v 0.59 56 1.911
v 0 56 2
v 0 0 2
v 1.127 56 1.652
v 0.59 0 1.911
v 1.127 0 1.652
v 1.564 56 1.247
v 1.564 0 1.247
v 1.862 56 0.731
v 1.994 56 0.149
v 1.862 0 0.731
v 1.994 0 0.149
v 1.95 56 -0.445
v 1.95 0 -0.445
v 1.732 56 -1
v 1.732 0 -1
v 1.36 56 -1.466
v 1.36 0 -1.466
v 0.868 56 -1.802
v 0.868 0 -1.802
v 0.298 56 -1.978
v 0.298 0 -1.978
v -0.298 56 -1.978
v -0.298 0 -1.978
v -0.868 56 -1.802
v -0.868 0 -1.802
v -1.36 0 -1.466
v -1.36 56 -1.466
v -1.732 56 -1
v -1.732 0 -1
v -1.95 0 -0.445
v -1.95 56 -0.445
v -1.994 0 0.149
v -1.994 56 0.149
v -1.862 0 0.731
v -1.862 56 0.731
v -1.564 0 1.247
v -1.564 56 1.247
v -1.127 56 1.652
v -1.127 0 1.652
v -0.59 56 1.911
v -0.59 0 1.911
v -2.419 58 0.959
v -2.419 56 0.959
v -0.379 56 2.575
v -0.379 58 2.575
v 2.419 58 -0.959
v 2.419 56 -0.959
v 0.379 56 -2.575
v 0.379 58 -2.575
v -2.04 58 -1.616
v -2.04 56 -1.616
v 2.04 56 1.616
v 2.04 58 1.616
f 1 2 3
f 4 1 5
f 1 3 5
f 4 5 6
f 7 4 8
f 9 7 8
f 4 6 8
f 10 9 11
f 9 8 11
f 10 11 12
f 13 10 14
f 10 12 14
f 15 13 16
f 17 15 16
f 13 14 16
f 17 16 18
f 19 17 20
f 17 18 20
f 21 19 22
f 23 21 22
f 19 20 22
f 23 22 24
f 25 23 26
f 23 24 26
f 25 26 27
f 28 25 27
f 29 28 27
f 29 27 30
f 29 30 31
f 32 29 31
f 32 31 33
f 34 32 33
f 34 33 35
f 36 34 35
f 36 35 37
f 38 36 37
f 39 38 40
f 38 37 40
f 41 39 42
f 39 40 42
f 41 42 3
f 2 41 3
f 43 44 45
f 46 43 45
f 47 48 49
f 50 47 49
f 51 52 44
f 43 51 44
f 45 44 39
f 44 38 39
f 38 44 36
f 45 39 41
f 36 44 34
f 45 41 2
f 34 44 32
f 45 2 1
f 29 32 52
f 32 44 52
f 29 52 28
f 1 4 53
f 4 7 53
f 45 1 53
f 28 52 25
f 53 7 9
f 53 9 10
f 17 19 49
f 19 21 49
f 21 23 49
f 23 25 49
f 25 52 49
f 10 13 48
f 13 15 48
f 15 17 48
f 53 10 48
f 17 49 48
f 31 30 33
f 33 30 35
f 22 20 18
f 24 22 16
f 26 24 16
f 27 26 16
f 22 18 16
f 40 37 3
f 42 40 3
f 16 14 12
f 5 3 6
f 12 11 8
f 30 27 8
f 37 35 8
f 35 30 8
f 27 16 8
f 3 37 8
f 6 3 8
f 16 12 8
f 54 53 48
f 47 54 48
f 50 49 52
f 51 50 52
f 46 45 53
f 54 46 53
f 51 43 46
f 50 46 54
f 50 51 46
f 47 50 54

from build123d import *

# Parameters (mm, degrees)
SKETCH1_R           = 2
BOSS_EXTRUDE1_DEPTH = 56
BOSS_EXTRUDE2_DEPTH = 2


with BuildPart() as part:
    # Sketch1 → Boss-Extrude1 (new body)
    with BuildSketch(Plane(origin=(0, 0, 0), x_dir=(1, 0, 0), z_dir=(0, 1, 0))):
        with Locations(Location((0, 0, 0), (0, 0, 270))):
            Circle(SKETCH1_R)
    extrude(amount=BOSS_EXTRUDE1_DEPTH)

    # Sketch2 → Boss-Extrude2 (add)
    with BuildSketch(Plane(origin=(0, 56, 0), x_dir=(1, 0, 0), z_dir=(0, 1, 0))):
        Polygon((2.039992028, -1.615670017), (2.419207293, 0.958849912), (0.379215264, 2.574519928), (-2.039992028, 1.615670017), (-2.419207293, -0.958849912), (-0.379215264, -2.574519928), align=None)
    extrude(amount=BOSS_EXTRUDE2_DEPTH)


solid = part.part
